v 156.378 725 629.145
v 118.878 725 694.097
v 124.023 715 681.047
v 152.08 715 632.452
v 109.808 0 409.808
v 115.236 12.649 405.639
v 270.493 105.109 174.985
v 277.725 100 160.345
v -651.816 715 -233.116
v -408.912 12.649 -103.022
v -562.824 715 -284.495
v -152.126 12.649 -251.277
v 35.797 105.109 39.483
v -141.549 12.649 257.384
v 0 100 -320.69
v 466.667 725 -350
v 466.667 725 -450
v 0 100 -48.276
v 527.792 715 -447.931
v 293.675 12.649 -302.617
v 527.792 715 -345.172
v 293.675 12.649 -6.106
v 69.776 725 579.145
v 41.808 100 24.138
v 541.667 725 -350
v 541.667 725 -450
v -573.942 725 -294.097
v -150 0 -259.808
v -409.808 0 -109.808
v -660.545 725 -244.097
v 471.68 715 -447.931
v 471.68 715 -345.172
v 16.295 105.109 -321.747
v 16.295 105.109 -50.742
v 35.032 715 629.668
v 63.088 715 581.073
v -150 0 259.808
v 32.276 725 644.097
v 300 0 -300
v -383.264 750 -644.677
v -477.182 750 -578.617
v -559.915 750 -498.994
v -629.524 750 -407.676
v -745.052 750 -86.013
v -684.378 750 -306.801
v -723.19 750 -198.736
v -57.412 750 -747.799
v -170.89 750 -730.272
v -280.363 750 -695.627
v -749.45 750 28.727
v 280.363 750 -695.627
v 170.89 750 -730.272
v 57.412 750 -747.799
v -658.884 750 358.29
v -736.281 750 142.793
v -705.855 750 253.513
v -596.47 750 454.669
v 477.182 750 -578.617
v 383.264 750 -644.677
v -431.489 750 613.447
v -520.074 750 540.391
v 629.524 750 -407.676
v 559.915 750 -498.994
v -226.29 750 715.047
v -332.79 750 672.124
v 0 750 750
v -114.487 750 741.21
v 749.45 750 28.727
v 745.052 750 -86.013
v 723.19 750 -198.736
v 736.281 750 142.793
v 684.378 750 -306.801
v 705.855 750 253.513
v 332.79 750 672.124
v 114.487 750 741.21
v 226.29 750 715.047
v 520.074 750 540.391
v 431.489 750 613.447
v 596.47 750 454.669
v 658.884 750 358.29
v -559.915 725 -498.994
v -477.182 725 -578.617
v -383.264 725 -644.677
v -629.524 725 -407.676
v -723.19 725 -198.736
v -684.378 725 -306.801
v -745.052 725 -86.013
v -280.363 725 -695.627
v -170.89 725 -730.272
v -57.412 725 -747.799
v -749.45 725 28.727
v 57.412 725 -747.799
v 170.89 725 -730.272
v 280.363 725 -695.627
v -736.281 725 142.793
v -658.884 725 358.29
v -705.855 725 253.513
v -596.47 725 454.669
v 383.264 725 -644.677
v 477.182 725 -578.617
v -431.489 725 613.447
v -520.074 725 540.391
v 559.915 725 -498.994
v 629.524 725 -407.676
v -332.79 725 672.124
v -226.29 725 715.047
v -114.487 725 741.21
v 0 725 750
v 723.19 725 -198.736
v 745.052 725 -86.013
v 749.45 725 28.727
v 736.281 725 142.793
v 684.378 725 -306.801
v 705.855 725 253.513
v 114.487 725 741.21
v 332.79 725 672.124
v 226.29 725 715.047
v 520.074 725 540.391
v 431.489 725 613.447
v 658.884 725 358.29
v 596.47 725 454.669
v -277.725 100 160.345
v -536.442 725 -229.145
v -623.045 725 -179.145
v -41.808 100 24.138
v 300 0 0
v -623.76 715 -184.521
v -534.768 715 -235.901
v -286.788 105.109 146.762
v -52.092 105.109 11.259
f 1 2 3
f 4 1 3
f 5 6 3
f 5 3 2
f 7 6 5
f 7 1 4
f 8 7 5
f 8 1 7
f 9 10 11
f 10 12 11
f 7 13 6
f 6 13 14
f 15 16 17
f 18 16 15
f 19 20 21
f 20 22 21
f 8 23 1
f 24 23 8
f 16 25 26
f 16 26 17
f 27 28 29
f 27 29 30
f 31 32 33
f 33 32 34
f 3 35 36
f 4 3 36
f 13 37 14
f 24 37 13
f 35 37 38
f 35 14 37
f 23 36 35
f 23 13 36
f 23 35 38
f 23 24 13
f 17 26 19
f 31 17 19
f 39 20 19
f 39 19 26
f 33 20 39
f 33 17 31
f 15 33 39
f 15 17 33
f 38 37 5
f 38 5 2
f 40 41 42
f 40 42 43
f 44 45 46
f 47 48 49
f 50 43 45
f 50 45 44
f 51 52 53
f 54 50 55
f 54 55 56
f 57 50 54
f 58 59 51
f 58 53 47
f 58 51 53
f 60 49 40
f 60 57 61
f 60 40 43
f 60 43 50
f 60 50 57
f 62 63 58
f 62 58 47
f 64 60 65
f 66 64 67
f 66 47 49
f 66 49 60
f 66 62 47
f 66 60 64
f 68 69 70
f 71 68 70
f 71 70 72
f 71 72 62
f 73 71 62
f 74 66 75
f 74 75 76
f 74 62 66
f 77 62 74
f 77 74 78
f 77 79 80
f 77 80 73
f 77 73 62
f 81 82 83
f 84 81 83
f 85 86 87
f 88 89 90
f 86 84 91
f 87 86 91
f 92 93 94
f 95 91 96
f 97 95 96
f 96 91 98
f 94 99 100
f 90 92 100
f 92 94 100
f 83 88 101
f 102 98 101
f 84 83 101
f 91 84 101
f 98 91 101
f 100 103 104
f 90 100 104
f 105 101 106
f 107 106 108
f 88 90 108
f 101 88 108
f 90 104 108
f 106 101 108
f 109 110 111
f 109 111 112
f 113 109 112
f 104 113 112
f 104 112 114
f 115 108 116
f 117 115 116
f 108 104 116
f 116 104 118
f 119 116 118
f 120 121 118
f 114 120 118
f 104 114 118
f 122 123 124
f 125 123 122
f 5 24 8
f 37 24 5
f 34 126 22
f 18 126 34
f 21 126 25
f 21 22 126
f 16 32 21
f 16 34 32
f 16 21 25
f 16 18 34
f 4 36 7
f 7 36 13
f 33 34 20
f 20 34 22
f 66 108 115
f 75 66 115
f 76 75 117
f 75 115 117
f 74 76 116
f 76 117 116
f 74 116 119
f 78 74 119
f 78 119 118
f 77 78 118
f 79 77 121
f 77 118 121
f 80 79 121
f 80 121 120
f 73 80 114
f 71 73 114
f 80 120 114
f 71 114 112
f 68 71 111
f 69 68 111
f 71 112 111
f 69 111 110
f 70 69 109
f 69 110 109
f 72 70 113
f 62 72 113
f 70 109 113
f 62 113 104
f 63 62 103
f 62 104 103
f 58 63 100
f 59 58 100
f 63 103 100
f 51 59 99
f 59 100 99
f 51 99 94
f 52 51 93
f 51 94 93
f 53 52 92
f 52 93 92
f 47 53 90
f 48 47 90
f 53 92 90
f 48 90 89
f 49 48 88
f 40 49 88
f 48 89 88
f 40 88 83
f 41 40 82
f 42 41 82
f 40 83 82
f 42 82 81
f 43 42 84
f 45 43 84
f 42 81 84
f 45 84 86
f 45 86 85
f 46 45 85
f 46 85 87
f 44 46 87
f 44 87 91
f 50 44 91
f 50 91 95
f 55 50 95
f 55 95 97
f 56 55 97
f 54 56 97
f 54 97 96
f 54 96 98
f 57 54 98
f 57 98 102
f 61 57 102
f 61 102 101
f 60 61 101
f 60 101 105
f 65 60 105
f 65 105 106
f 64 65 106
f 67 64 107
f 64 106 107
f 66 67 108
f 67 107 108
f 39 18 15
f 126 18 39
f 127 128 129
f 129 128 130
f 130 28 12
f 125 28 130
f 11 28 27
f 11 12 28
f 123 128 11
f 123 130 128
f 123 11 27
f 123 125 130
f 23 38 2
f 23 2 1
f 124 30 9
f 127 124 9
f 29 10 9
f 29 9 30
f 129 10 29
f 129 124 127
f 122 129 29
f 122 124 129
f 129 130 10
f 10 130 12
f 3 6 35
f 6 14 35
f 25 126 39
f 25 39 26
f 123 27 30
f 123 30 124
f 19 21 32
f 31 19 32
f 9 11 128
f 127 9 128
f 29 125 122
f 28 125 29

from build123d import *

# Parameters (mm, degrees)
SALIENTE_EXTRUIR1_DEPTH    = 500
CROQUIS2_OUTSIDE_W         = 708.788
CROQUIS2_OUTSIDE_H         = 933.788
CORTAR_EXTRUIR2_DEPTH      = 650
CORTAR_EXTRUIR2_DEPTH_BACK = 50
VACIADO2_T                 = -10
MATRIZC1_COUNT             = 3
SALIENTE_EXTRUIR2_START    = 725
CROQUIS5_R                 = 750
SALIENTE_EXTRUIR2_DEPTH    = 25


with BuildPart() as part:
    # Croquis1 → Saliente-Extruir1 (new body)
    with BuildSketch(Plane.XY):
        Polygon((300, 0), (541.666666667, 725), (466.666666667, 725), (0, 100), align=None)
    extrude(amount=-SALIENTE_EXTRUIR1_DEPTH)

    # Croquis2 outside → Cortar-Extruir2 (cut, two sides)
    with BuildSketch(Plane(origin=(0, 0, 0), x_dir=(0, 0, -1), z_dir=(1, 0, 0))) as cortar_extruir2_sk:
        with Locations((250, 362.5)):
            Rectangle(CROQUIS2_OUTSIDE_W, CROQUIS2_OUTSIDE_H)
        Polygon((0, 0), (350, 725), (450, 725), (300, 0), align=None, mode=Mode.SUBTRACT)
    extrude(amount=CORTAR_EXTRUIR2_DEPTH, mode=Mode.SUBTRACT)
    extrude(cortar_extruir2_sk.sketch, amount=-CORTAR_EXTRUIR2_DEPTH_BACK, mode=Mode.SUBTRACT)

    # Vaciado2
    vaciado2_openings = [part.faces().sort_by_distance(p)[0] for p in [
        (289.580826314, 314.259927798, -365.019295406),
        (289.580826314, 314.259927798, -151.711689282),
    ]]
    offset(amount=VACIADO2_T, openings=vaciado2_openings, kind=Kind.INTERSECTION)


with BuildPart() as matrizc1_1:
    # MatrizC1: pattern copy
    add(part.part.rotate(Axis((0, 0, 0), (0, 1, 0)), 1 * 360 / MATRIZC1_COUNT))


with BuildPart() as matrizc1_2:
    # MatrizC1: pattern copy
    add(part.part.rotate(Axis((0, 0, 0), (0, 1, 0)), 2 * 360 / MATRIZC1_COUNT))


with BuildPart() as body_4:
    # Croquis5 → Saliente-Extruir2 (new body)
    with BuildSketch(Plane(origin=(0, 0, 0), x_dir=(1, 0, 0), z_dir=(0, 1, 0)).offset(SALIENTE_EXTRUIR2_START)):
        with Locations(Location((0, 0, 0), (0, 0, 270))):  # turned: the seam where the file's is
            Circle(CROQUIS5_R)
    extrude(amount=SALIENTE_EXTRUIR2_DEPTH)


solid = Compound([part.part, matrizc1_1.part, matrizc1_2.part, body_4.part])
